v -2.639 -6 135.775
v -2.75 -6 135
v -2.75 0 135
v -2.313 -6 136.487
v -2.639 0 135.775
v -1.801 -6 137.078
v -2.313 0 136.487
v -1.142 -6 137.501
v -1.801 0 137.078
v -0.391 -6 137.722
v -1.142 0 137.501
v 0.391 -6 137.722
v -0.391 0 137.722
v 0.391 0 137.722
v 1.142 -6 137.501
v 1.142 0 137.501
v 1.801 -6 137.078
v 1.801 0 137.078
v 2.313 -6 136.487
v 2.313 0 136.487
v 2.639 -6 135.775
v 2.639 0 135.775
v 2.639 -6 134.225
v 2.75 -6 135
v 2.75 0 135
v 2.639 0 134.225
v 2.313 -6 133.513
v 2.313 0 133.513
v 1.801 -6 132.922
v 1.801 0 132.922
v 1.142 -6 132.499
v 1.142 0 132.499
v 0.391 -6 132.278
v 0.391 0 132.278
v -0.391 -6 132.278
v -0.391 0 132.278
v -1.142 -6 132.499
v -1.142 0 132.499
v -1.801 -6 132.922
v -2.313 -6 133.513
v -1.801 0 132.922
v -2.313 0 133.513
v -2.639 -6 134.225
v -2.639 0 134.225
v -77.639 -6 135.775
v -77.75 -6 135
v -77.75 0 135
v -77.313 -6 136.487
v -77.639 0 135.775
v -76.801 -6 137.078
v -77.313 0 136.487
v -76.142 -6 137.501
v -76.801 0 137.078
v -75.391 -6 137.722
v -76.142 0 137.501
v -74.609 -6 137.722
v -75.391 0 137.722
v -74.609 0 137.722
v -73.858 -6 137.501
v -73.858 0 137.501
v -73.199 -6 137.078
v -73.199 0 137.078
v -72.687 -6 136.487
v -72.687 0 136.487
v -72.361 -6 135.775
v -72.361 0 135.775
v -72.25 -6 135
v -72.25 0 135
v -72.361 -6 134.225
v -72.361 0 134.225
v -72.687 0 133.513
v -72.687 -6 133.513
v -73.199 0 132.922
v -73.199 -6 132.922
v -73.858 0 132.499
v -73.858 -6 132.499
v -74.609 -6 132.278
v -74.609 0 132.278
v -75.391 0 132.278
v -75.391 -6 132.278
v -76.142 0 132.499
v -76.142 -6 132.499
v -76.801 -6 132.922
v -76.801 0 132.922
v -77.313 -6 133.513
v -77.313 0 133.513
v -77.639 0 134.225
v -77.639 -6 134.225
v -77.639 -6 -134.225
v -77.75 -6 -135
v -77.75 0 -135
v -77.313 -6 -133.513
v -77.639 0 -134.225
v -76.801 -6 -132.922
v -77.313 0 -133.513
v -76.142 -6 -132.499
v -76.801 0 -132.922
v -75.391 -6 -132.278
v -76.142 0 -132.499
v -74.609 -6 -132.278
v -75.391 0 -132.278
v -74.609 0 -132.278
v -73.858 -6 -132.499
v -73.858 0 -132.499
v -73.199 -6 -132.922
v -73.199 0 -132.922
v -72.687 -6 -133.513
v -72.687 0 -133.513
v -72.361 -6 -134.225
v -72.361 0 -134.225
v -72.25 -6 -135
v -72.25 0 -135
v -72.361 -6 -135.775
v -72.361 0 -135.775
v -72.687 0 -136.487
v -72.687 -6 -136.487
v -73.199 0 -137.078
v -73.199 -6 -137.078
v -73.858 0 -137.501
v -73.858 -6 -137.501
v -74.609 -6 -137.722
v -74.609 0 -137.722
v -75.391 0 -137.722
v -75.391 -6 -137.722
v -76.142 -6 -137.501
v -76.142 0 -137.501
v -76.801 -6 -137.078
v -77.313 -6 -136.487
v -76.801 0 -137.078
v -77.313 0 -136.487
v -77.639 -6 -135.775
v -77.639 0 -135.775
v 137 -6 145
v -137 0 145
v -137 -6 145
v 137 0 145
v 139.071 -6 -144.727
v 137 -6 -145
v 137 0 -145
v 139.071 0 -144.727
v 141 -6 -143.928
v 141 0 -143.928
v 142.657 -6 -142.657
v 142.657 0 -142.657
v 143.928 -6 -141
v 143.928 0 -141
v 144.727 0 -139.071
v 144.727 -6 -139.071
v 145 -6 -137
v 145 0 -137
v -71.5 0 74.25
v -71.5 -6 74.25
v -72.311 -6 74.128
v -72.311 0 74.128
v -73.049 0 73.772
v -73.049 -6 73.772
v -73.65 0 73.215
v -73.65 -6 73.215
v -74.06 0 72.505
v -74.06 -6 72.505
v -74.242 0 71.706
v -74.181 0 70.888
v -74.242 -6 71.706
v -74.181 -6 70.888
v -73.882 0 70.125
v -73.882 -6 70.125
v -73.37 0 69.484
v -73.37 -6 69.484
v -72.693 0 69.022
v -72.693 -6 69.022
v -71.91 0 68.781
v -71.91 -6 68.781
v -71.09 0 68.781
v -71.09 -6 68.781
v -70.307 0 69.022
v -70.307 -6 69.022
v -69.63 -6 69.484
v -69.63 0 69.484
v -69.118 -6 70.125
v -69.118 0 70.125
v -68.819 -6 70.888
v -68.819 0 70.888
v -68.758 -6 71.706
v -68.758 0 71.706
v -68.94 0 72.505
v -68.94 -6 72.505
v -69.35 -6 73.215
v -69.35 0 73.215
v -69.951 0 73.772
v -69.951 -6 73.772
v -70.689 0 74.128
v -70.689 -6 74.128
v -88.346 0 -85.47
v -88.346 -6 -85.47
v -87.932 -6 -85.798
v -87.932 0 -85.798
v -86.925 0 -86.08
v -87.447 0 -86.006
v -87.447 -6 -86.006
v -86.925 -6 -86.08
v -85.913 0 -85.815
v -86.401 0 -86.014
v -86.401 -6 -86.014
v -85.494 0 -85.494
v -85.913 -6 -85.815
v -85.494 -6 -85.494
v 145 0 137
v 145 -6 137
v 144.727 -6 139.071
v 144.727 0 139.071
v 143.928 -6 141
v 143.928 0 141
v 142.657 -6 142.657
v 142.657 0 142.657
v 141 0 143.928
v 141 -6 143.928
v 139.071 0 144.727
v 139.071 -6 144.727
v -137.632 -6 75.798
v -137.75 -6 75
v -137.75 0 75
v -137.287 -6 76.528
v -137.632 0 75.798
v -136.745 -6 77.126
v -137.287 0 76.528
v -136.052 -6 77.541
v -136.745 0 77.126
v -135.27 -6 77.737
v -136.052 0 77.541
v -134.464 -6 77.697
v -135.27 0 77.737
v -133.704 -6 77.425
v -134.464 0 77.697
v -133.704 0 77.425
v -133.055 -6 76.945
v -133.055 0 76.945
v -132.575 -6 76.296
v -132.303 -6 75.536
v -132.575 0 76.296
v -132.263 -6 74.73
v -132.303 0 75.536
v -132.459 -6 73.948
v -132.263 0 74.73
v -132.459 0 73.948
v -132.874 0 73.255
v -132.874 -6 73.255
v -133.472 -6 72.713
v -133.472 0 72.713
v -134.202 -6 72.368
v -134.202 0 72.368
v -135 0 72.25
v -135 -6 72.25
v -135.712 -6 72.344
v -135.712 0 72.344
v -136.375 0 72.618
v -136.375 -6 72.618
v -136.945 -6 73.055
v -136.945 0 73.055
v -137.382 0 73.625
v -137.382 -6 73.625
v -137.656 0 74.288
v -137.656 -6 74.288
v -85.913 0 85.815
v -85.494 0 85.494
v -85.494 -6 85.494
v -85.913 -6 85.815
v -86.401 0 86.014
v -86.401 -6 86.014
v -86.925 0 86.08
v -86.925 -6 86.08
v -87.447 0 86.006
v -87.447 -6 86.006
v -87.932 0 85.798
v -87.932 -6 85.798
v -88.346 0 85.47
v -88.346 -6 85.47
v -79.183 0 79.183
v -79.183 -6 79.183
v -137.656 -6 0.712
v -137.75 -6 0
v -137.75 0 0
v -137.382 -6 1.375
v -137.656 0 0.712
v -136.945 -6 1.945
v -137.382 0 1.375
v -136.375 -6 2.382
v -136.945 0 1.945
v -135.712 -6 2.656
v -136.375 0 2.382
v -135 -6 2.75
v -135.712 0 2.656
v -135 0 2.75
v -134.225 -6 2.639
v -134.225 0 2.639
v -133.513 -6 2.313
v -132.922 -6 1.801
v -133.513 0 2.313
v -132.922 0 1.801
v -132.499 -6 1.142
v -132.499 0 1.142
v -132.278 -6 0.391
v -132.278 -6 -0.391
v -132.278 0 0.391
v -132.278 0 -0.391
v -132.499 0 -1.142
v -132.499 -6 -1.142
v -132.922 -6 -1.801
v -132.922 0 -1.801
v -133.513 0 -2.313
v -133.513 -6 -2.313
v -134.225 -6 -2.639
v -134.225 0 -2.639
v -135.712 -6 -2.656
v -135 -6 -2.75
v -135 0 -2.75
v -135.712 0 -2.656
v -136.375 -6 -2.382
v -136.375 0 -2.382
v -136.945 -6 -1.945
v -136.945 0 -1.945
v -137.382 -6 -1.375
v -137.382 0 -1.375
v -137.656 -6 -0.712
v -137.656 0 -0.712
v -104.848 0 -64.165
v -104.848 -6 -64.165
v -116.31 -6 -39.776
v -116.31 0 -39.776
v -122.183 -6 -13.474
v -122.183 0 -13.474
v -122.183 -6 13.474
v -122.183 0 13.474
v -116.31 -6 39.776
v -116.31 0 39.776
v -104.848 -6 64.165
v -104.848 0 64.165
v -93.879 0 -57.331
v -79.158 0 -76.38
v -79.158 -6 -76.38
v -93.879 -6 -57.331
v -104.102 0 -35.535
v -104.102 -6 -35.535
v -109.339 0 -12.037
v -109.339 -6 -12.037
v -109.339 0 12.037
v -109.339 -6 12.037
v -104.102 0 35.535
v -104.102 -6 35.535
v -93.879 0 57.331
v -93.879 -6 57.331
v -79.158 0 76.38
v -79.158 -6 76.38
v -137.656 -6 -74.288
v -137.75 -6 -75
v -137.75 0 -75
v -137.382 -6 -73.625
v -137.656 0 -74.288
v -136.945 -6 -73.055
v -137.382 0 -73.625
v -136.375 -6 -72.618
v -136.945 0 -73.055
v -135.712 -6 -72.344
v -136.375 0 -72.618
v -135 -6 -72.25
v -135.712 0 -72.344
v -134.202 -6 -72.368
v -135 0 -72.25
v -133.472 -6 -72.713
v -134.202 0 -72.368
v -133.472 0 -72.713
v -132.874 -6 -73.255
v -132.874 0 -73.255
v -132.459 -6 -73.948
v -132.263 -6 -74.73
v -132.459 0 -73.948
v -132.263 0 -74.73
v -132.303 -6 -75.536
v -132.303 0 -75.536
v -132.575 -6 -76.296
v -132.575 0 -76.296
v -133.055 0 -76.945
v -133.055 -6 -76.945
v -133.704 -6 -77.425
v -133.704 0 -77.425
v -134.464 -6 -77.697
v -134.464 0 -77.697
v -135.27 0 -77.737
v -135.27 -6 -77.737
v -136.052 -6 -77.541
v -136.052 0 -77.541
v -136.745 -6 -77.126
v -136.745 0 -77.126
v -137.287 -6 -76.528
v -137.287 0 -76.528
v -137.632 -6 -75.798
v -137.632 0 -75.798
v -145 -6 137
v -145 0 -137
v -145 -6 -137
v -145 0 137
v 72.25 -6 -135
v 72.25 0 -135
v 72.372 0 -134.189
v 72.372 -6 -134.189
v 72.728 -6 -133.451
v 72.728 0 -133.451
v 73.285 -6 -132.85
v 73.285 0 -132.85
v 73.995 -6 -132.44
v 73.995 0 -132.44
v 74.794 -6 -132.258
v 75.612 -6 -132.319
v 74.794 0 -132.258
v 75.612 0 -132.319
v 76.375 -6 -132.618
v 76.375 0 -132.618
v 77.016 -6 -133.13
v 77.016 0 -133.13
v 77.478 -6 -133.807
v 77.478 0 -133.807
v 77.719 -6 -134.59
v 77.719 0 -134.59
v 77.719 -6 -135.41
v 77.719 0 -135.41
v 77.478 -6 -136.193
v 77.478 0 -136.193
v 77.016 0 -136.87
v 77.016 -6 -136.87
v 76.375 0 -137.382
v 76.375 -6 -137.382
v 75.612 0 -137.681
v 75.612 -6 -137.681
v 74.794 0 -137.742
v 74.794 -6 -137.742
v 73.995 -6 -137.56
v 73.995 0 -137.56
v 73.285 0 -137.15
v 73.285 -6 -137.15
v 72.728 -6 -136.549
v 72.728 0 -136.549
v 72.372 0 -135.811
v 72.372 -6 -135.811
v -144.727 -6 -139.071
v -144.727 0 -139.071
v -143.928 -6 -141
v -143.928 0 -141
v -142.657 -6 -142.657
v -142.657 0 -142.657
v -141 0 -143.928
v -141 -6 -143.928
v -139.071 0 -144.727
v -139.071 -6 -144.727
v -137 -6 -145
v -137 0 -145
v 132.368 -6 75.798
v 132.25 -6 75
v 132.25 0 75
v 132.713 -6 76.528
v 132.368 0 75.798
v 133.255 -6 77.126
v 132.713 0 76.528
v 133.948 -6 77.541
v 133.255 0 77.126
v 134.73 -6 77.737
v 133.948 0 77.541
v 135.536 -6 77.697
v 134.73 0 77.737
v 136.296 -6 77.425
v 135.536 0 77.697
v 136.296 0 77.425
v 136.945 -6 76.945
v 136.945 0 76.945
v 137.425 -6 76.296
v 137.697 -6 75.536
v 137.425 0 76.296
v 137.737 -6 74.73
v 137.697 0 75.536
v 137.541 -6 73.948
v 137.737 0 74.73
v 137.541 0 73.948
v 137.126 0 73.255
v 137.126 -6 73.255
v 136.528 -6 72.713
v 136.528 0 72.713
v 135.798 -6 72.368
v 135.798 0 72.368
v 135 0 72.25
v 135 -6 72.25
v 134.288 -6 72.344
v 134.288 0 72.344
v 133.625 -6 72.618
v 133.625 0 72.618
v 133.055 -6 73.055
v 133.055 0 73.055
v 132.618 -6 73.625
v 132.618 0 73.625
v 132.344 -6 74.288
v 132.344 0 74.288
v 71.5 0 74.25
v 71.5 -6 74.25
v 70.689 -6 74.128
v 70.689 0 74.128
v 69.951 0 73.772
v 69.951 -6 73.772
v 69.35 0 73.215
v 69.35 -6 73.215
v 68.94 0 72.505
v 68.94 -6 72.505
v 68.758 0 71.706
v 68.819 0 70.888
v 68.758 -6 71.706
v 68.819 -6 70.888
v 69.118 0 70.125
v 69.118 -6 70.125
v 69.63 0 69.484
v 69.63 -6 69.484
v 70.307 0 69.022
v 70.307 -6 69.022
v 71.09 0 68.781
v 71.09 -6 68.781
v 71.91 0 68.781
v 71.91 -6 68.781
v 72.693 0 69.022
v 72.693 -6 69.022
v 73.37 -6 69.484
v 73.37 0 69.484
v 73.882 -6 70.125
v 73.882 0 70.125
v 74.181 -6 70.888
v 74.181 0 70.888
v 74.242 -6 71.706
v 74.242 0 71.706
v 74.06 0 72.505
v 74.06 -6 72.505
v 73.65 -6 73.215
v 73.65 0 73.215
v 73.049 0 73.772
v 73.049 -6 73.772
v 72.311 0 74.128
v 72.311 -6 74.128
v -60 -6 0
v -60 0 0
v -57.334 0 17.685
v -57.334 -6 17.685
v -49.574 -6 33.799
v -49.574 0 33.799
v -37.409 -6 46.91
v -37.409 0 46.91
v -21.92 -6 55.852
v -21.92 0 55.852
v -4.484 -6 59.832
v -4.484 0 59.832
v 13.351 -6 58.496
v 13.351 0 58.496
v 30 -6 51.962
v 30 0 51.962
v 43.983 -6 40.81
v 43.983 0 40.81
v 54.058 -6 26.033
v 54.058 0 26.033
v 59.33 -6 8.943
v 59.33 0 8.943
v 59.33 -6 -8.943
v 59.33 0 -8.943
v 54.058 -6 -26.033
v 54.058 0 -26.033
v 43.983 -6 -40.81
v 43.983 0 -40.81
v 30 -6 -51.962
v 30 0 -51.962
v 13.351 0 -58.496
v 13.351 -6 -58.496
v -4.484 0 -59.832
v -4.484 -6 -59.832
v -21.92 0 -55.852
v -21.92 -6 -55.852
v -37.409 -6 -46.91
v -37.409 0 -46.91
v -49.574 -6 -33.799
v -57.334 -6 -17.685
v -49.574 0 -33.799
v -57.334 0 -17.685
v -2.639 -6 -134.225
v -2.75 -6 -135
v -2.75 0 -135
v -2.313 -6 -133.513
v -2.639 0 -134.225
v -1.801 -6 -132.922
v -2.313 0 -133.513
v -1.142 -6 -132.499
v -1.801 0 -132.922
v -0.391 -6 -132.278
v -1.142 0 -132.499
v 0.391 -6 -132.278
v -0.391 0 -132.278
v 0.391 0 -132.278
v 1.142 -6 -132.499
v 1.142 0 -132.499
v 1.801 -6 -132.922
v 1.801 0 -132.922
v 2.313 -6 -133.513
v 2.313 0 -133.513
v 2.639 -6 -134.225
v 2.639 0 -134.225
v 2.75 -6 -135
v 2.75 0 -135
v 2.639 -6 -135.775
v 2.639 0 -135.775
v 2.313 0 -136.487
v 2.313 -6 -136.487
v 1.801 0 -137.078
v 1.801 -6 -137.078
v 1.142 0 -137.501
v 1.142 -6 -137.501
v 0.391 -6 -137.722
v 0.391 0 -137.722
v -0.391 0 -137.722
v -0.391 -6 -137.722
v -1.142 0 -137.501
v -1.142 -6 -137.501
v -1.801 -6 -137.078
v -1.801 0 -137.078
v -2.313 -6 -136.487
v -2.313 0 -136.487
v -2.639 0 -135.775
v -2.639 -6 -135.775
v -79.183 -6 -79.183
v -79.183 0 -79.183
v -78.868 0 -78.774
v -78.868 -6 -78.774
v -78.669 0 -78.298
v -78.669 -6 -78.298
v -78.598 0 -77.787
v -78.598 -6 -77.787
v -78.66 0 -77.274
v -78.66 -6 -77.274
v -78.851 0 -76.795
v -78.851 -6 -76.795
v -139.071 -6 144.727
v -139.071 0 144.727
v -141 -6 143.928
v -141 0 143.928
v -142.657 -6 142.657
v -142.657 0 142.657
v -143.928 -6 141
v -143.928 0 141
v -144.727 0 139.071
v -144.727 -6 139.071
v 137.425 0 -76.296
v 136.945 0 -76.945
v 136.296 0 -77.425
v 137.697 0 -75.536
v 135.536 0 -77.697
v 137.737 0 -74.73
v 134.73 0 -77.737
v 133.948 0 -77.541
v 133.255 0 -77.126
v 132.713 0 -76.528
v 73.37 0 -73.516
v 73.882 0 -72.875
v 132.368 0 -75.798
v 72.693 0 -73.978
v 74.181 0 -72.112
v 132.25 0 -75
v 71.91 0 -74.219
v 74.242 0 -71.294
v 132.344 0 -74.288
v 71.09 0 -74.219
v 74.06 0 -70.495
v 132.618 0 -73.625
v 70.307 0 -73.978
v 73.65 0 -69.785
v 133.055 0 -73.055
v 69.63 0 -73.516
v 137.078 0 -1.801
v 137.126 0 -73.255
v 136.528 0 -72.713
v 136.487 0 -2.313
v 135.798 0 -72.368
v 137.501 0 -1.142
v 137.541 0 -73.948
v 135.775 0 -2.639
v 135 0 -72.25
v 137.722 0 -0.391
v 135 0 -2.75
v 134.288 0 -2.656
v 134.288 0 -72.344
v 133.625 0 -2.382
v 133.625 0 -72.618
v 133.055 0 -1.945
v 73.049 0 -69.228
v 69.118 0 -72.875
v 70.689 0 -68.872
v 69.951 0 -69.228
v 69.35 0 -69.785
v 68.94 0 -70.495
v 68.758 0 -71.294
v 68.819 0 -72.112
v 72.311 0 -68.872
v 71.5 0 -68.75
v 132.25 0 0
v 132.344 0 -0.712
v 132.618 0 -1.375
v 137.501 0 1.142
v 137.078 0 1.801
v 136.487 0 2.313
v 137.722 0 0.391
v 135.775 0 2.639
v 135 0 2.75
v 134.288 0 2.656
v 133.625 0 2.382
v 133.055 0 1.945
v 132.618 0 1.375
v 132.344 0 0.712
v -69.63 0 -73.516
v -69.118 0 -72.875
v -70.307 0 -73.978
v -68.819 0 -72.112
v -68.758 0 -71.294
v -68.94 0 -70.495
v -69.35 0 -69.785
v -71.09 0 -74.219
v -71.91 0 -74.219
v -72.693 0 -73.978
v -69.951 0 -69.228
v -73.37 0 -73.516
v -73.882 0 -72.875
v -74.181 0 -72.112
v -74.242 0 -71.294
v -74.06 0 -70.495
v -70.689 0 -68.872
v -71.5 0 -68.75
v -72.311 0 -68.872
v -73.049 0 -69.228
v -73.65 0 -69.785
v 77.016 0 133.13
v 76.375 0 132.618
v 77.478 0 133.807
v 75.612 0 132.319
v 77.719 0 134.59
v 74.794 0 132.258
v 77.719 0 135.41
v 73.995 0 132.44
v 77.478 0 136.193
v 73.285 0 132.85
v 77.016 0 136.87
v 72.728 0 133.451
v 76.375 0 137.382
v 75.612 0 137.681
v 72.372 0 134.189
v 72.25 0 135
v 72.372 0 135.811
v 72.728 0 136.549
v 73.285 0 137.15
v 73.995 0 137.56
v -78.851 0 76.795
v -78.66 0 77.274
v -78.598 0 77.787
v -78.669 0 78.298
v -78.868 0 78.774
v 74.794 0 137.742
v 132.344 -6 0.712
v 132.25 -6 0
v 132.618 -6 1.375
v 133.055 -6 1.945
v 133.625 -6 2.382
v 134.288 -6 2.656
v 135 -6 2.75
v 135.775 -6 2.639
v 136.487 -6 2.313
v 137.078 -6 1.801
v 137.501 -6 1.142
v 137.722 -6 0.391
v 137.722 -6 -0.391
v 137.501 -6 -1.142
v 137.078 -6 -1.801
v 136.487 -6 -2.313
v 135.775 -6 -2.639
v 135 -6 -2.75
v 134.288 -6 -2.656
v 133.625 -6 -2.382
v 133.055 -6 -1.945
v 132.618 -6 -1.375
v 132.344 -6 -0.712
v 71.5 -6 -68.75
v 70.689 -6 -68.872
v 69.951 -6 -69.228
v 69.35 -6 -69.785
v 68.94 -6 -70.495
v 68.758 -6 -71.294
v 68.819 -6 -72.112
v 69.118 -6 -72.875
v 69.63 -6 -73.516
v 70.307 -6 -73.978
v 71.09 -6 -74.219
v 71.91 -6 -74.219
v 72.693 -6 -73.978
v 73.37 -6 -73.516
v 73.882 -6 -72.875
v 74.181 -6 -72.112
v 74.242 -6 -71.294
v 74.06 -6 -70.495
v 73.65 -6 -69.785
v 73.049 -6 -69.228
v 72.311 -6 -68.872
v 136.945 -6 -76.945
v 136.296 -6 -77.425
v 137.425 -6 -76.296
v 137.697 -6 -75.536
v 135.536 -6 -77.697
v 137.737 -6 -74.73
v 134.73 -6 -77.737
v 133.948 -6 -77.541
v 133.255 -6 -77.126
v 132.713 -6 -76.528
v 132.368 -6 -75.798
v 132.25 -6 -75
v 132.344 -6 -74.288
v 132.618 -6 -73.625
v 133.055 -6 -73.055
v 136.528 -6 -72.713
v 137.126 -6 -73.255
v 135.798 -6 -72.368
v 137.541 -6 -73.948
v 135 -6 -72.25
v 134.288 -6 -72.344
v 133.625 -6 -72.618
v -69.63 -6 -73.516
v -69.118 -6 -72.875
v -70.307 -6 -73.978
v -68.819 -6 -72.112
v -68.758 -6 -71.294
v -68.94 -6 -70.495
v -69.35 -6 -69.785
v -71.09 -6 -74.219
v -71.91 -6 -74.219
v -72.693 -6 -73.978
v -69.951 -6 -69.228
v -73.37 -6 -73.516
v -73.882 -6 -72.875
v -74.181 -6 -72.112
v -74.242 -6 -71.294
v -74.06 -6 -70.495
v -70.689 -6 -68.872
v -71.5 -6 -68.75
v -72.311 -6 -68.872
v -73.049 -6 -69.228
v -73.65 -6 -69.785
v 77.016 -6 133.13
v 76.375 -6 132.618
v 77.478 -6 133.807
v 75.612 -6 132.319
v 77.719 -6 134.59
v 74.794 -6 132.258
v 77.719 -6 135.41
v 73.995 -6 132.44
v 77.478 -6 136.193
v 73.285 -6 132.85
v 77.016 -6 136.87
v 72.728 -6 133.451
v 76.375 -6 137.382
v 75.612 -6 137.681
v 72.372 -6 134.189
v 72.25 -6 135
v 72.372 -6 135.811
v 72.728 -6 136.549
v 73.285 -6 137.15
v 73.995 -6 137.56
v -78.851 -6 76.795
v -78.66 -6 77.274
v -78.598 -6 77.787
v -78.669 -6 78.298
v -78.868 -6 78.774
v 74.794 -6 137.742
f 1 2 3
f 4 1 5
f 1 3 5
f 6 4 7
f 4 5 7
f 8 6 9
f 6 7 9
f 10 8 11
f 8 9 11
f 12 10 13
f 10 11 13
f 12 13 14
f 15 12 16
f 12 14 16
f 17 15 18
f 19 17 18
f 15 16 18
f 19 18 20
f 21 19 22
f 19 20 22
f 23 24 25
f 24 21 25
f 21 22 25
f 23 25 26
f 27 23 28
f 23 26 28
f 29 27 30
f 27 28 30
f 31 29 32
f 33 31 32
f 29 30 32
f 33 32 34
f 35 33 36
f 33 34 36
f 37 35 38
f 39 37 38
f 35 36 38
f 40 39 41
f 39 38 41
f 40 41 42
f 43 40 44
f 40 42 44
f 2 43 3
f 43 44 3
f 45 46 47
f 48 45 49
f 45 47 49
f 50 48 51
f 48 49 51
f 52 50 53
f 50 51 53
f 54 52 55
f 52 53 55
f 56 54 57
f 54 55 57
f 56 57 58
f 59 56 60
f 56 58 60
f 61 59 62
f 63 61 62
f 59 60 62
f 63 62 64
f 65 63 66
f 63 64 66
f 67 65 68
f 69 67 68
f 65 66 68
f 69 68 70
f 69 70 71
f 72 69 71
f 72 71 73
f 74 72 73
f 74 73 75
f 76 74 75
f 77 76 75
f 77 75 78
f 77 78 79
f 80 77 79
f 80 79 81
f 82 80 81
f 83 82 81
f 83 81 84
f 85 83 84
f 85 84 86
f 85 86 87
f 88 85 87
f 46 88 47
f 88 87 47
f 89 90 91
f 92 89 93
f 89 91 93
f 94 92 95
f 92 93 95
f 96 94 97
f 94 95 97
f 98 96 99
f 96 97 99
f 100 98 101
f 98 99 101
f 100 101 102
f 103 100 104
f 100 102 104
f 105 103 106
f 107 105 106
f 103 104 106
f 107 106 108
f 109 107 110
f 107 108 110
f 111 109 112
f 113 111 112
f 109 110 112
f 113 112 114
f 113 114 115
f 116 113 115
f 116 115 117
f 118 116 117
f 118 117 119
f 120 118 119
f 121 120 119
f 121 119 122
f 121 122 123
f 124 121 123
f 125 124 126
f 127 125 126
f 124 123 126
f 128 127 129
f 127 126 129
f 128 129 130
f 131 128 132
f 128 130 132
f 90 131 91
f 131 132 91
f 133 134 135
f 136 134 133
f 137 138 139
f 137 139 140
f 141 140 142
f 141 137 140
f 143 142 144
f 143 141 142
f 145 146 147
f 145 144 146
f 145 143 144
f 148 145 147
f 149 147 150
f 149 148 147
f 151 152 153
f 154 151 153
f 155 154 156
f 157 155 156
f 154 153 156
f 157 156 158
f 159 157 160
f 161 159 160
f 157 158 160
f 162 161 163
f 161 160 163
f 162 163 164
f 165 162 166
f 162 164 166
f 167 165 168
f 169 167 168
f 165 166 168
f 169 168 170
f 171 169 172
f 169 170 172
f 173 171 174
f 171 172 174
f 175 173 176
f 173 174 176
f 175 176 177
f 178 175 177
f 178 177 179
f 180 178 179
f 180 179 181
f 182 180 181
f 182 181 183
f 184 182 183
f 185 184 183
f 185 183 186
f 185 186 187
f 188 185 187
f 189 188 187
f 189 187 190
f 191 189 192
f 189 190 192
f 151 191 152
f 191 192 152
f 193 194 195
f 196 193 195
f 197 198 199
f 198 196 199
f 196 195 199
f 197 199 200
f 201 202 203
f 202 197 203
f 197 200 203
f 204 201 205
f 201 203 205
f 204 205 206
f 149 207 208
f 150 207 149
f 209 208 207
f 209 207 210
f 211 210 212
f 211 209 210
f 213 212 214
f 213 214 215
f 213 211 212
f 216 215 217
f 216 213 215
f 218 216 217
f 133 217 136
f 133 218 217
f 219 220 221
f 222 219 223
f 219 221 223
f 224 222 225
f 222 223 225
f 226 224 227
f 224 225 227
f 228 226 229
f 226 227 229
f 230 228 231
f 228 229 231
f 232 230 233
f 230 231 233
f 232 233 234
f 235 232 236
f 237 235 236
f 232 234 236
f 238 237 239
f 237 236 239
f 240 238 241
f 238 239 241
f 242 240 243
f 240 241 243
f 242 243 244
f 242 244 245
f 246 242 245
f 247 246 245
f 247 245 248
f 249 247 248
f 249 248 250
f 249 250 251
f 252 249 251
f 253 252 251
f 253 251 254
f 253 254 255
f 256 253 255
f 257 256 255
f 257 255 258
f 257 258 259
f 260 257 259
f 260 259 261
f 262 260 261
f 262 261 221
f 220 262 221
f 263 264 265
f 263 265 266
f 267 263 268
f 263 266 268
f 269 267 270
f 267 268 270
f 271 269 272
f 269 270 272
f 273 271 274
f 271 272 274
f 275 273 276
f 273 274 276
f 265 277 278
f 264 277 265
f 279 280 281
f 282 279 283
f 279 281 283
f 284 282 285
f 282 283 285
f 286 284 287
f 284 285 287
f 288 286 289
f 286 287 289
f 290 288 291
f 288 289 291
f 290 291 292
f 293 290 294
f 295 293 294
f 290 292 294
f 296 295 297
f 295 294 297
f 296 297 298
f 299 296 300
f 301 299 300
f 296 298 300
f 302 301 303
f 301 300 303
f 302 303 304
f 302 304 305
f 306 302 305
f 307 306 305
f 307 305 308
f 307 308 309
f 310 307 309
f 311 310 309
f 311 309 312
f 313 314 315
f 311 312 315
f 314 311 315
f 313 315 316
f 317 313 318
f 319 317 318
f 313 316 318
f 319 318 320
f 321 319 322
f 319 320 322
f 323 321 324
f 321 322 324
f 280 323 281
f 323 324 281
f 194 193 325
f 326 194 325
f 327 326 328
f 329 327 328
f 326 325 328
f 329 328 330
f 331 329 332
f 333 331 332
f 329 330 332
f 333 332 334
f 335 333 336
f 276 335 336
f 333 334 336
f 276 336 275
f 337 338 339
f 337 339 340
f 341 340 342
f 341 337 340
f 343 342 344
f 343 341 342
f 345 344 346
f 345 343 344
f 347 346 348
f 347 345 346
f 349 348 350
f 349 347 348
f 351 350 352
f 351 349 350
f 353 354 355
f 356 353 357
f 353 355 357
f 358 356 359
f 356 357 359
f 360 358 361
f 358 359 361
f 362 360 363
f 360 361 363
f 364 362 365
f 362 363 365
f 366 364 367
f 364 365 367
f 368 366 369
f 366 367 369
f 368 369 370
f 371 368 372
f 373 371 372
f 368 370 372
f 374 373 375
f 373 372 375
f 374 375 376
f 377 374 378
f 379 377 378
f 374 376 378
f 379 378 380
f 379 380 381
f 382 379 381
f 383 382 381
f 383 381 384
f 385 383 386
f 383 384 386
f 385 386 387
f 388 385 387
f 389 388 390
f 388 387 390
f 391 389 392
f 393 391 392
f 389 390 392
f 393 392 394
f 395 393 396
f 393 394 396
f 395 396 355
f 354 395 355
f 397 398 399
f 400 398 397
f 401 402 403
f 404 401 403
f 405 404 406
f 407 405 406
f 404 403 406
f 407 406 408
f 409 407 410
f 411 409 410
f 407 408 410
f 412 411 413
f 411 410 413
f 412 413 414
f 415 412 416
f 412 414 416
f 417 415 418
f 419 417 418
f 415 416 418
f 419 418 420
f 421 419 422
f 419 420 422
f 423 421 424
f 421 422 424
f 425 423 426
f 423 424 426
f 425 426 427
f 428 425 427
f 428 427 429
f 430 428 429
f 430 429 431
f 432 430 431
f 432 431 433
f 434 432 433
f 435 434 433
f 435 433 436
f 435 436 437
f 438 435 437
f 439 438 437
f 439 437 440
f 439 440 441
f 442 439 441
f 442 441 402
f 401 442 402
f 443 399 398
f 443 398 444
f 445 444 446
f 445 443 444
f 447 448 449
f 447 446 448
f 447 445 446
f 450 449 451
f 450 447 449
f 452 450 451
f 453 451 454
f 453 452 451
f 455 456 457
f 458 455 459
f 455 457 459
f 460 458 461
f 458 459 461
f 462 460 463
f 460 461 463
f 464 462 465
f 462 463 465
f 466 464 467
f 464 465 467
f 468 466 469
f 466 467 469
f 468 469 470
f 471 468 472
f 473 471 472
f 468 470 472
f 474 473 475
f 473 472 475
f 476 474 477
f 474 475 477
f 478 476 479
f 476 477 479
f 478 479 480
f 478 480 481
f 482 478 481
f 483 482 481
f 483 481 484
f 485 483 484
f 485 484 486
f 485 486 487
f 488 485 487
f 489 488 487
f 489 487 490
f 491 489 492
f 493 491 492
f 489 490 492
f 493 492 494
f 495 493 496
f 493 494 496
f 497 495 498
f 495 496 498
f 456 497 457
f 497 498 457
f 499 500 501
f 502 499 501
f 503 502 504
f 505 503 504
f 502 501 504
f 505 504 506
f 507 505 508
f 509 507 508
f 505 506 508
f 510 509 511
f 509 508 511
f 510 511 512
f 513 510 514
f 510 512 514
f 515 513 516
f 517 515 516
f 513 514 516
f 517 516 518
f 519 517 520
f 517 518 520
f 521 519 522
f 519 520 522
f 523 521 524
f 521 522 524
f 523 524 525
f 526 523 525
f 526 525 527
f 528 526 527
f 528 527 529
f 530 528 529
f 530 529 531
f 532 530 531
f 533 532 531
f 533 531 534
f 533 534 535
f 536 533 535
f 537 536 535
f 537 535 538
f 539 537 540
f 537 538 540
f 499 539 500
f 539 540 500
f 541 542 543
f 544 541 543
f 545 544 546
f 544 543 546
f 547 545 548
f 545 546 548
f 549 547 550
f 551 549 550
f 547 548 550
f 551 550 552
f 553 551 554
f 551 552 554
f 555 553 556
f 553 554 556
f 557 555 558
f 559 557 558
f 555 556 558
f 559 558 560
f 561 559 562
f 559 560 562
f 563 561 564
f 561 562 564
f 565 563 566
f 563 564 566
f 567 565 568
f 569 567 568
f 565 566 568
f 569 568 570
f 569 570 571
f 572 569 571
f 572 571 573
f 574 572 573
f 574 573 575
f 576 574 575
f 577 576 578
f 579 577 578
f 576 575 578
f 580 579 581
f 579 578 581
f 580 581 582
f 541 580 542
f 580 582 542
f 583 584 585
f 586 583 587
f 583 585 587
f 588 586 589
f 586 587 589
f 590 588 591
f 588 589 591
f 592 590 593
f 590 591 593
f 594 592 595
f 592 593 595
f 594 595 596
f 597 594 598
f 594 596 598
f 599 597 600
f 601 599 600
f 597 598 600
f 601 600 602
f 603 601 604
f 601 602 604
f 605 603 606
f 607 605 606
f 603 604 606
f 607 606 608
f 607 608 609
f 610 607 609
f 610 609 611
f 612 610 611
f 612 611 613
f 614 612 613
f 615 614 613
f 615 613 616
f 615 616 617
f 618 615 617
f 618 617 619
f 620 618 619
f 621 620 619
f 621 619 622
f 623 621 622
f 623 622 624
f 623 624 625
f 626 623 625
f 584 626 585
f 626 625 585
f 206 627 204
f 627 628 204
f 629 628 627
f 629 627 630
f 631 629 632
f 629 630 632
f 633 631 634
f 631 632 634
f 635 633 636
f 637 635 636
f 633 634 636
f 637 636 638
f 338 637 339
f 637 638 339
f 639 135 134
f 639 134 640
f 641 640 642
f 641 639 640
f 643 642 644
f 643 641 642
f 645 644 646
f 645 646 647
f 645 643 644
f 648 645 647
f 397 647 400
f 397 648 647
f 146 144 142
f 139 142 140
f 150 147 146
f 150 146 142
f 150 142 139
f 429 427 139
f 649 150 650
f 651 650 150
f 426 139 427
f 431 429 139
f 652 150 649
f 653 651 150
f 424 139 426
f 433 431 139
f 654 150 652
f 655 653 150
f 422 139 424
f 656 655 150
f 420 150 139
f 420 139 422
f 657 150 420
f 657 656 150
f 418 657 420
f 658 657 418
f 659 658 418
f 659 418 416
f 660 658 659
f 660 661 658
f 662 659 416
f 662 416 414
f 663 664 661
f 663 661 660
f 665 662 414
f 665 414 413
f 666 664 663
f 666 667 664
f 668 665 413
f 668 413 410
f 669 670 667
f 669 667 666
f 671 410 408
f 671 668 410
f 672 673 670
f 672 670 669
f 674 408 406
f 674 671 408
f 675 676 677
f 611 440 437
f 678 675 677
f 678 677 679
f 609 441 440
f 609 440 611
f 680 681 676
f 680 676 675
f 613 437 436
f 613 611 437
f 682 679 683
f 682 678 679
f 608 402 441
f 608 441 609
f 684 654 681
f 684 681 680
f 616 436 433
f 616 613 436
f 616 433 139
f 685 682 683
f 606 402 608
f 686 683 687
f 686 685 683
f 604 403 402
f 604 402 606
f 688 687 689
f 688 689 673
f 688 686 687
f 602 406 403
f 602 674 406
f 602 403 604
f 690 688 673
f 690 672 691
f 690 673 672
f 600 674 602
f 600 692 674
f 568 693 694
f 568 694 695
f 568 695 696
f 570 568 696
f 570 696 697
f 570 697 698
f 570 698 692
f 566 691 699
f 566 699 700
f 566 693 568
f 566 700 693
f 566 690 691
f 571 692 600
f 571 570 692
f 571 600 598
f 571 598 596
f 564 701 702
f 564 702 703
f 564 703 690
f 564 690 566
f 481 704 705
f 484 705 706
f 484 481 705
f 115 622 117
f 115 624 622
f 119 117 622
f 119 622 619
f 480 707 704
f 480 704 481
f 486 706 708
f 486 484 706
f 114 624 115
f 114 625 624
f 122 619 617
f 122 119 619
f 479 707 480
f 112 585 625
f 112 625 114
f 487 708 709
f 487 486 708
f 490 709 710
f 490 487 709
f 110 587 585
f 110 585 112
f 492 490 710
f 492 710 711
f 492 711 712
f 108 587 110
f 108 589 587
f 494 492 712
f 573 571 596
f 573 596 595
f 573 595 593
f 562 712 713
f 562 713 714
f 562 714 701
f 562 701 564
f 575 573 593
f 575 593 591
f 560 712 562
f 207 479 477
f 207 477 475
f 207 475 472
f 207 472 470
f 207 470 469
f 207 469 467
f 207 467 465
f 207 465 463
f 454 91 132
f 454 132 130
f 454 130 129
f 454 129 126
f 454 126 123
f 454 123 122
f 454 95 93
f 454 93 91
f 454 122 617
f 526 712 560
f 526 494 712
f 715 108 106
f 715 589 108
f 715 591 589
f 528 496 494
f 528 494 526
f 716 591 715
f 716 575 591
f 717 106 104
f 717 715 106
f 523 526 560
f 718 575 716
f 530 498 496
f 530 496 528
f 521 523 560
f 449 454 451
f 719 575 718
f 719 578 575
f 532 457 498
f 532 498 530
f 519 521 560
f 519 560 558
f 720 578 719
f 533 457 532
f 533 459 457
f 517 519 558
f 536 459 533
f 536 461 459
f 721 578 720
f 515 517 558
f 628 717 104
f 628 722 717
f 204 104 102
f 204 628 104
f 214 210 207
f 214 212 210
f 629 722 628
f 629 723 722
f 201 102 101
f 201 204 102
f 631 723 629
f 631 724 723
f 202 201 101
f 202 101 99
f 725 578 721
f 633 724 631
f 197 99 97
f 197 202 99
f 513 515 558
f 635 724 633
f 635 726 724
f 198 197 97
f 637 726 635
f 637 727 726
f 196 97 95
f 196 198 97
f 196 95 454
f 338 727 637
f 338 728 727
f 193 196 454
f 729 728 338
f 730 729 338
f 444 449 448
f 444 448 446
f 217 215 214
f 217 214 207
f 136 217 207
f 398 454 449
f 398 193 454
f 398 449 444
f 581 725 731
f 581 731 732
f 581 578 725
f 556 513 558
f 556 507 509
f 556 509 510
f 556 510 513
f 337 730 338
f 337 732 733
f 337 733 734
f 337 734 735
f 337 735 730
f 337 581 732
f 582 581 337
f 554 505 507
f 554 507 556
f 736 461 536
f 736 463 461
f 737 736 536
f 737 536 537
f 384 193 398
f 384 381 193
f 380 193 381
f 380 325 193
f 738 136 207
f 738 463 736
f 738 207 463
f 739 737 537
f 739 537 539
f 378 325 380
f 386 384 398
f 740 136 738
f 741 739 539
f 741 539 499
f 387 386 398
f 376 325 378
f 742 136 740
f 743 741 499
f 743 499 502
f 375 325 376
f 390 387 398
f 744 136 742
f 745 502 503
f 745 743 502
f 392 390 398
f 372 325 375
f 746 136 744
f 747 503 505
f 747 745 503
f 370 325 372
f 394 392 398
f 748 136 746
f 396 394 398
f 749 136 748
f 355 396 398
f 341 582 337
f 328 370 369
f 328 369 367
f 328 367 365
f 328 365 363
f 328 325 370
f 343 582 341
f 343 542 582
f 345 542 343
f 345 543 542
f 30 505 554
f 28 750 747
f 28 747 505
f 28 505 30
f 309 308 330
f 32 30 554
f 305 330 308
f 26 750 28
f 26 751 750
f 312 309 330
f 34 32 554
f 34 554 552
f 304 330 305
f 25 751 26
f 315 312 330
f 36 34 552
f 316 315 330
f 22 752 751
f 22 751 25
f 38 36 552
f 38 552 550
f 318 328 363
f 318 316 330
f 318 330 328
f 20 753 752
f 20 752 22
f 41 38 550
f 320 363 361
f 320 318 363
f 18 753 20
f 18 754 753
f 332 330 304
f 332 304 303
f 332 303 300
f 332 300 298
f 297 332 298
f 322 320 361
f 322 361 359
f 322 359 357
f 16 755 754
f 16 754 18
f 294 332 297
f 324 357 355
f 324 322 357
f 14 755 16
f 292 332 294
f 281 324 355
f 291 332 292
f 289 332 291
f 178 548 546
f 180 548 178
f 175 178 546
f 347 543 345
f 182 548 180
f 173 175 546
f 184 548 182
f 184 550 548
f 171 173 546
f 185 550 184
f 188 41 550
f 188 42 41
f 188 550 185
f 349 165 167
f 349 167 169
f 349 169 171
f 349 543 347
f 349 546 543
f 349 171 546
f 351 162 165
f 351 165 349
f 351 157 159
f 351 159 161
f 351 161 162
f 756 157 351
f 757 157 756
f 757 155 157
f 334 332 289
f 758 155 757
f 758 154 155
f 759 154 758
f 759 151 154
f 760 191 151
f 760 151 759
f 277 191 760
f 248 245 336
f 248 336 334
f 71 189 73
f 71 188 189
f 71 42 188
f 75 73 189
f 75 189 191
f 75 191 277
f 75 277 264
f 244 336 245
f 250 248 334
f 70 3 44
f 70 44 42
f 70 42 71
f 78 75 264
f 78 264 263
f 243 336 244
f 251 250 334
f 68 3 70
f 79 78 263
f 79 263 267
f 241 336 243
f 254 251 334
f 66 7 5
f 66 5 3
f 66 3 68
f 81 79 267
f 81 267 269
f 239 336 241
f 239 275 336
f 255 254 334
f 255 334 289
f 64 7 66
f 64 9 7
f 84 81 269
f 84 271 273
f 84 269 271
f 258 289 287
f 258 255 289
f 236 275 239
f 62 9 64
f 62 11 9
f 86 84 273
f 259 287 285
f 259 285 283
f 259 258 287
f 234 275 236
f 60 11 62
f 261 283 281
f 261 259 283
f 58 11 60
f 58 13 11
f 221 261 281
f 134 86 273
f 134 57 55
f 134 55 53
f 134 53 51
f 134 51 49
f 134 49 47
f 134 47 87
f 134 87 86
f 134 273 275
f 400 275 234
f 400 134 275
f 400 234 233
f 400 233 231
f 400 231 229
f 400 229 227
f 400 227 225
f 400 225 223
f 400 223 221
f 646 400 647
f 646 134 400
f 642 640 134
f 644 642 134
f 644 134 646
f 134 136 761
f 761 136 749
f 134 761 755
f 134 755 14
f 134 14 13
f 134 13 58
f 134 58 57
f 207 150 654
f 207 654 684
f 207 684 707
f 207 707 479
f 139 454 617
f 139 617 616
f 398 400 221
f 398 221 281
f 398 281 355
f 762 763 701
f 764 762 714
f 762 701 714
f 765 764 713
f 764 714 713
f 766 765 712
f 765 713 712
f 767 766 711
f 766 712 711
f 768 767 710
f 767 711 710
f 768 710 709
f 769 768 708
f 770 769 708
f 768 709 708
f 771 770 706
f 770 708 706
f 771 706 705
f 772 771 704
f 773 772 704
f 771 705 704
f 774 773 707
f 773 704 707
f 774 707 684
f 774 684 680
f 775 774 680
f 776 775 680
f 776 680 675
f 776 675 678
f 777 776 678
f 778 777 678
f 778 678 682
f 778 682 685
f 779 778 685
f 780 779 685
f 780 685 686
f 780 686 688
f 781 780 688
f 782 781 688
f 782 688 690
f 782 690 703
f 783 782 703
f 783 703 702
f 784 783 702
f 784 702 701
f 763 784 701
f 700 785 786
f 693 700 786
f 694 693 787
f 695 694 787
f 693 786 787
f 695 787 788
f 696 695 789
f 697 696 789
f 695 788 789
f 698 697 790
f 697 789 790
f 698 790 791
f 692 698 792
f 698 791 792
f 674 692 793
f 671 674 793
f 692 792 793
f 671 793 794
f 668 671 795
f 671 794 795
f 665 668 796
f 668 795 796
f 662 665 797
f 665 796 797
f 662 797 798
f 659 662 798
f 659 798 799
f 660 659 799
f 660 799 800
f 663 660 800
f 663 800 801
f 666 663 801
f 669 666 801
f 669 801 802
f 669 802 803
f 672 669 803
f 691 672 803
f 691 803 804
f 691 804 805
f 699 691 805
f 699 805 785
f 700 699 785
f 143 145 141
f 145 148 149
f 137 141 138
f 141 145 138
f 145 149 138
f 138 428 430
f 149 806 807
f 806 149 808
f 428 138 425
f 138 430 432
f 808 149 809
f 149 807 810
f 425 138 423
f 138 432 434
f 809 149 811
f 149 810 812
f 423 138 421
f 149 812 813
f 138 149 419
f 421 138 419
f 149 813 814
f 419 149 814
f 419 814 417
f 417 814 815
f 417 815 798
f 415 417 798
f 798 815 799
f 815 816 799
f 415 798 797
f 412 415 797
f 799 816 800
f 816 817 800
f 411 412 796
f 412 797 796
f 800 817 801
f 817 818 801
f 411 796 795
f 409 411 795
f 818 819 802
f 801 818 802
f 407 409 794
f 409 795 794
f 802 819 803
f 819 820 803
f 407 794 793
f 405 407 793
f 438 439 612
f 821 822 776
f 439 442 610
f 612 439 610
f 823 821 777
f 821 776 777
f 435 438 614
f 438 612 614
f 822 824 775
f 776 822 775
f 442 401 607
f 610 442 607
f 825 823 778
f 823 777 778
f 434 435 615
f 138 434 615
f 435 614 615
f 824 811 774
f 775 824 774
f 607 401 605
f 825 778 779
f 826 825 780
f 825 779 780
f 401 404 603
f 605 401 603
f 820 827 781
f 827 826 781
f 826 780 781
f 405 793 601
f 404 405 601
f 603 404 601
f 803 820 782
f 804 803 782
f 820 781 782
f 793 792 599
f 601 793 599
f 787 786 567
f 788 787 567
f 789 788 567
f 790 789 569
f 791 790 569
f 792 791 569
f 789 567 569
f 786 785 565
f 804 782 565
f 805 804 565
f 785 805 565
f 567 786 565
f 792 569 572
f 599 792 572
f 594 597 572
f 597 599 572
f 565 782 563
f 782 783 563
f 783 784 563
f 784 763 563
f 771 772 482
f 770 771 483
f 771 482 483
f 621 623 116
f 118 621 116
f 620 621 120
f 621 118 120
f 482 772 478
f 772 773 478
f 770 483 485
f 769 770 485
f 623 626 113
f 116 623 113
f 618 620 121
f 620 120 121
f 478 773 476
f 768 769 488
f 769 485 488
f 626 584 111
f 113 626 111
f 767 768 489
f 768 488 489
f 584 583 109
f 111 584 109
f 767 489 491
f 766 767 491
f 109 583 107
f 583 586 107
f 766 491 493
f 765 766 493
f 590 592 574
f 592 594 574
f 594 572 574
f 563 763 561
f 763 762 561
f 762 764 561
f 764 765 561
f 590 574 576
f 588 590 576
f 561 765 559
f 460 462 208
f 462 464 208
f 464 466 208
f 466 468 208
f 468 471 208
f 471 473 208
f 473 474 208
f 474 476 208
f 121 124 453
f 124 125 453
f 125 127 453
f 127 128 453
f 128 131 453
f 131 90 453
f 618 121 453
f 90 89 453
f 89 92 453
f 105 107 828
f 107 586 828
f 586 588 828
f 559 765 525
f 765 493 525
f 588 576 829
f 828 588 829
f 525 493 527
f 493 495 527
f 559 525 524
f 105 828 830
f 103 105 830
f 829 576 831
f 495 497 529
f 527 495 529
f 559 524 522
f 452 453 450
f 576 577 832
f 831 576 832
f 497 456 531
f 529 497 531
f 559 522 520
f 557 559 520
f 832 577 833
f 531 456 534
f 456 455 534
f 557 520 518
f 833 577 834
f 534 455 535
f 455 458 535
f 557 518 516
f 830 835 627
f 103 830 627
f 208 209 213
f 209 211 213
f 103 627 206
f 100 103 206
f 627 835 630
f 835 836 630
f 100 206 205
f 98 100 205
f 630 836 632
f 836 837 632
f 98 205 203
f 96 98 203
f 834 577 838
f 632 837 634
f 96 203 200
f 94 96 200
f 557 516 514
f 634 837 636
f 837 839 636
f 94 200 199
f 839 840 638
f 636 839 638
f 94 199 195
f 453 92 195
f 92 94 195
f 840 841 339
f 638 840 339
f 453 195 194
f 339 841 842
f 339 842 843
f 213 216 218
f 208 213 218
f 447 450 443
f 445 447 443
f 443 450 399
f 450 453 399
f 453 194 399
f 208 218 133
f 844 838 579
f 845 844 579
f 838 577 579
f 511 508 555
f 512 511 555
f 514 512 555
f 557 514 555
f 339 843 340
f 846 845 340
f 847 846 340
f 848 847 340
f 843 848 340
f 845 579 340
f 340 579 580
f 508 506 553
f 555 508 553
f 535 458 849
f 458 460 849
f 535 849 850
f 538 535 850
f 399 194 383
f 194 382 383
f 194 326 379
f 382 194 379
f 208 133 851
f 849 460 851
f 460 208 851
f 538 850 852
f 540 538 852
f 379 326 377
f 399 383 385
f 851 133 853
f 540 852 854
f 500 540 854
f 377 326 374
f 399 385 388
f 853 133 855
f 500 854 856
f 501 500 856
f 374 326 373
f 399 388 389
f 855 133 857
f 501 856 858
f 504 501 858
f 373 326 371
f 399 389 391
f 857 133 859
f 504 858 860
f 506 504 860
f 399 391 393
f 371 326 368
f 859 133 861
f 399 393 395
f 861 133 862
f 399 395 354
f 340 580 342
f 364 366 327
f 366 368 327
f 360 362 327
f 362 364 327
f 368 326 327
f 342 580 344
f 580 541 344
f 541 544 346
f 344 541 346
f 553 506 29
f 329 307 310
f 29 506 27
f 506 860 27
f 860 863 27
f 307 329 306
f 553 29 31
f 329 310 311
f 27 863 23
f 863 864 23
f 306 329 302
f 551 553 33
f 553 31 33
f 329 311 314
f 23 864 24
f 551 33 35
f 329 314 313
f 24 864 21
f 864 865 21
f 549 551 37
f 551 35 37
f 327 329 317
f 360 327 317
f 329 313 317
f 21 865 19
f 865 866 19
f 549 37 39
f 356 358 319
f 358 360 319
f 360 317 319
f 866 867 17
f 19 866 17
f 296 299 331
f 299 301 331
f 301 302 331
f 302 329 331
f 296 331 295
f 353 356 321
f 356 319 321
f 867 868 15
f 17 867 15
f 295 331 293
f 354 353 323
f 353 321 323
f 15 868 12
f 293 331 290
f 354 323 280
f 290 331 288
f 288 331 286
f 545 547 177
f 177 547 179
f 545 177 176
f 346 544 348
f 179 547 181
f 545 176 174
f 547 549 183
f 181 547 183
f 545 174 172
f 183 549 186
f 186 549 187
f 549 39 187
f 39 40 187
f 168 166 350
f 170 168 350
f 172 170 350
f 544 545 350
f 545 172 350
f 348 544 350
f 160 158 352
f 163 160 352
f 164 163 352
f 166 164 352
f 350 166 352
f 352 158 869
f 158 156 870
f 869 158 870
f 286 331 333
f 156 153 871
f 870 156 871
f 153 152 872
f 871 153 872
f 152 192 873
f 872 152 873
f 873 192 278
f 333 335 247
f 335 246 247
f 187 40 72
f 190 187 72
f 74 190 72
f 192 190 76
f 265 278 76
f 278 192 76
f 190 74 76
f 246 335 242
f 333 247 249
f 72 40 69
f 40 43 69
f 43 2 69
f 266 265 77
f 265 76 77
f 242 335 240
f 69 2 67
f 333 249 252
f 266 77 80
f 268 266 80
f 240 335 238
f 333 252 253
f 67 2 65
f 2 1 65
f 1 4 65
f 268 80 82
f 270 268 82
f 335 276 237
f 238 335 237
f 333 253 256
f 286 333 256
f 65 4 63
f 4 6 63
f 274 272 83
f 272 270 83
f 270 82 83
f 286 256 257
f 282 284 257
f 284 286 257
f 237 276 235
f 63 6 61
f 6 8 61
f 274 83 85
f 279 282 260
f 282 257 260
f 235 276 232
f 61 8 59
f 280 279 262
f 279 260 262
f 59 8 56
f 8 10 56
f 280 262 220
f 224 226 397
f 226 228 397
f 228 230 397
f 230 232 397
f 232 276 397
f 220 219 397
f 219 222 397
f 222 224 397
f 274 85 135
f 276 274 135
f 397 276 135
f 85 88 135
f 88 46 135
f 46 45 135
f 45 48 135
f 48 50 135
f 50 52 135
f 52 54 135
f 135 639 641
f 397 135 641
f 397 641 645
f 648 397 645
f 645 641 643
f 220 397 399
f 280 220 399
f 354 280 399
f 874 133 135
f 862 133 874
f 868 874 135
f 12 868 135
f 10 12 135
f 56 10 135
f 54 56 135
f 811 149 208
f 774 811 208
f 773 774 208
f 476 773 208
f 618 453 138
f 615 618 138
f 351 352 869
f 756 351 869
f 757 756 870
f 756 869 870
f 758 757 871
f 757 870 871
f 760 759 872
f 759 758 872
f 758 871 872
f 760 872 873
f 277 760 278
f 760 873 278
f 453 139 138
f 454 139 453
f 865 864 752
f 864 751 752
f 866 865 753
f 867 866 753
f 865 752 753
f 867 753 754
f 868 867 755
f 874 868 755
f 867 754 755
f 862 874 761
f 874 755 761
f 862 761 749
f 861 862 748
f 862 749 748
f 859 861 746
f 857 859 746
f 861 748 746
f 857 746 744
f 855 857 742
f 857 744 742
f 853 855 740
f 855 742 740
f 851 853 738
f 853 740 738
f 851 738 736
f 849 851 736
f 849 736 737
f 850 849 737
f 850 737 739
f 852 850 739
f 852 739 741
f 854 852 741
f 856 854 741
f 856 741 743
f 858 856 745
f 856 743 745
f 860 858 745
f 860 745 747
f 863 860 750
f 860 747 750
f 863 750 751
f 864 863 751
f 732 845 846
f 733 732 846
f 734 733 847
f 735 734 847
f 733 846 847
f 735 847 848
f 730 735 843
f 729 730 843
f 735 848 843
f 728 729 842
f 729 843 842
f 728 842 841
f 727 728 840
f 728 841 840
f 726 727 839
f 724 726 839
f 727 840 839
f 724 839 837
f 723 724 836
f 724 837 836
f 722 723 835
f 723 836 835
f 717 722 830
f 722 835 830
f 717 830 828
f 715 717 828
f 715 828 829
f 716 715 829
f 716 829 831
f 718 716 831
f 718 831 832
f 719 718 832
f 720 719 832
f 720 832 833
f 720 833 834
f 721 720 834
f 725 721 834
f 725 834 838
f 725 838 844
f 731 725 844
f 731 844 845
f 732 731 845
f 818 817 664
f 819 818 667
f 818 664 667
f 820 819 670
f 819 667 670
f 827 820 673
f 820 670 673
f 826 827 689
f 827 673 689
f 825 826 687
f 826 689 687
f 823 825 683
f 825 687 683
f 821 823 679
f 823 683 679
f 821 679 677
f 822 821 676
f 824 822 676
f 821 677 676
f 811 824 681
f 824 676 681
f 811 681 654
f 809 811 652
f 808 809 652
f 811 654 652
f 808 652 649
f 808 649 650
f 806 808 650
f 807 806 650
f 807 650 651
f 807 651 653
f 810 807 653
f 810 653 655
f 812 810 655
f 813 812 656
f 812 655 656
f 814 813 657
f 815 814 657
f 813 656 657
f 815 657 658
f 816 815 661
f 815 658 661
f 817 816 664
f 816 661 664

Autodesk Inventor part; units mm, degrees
ref_plane "YZ Plane" through (0, 0, 0) normal (1, 0, 0) x (0, 1, 0)
ref_plane "XZ Plane" through (0, 0, 0) normal (0, 1, 0) x (-1, 0, 0)
ref_plane "XY Plane" through (0, 0, 0) normal (0, 0, 1) x (1, 0, 0)
sketch "Sketch1" plane through (0, 0, 0) normal (0, 1, 0) x (-1, 0, 0)
  line L0 (-145, -145) -> (145, -145)
  line L1 (145, -145) -> (145, 145)
  line L2 (145, 145) -> (-145, 145)
  line L3 (-145, 145) -> (-145, -145)
  line L4 (-145, -145) -> (145, 145) construction
  line L5 (145, -145) -> (-145, 145) construction
  circle A0 centre (0, 0) radius 60
  line L6 (135, 135) -> (135, -135) construction
  line L7 (135, -135) -> (-135, -135) construction
  line L8 (-135, -135) -> (-135, 135) construction
  line L9 (-135, 135) -> (135, 135) construction
  line L10 (145, 135) -> (125, 135) construction
  line L11 (125, 135) -> (125, -135) construction
  line L12 (-145, 135) -> (-125, 135) construction
  line L13 (-125, 135) -> (-125, -135) construction
  line L14 (-125, 135) -> (125, 135) construction
  line L15 (-125, -135) -> (125, -135) construction
  line L16 (135, 125) -> (135, -125) construction
  line L17 (-135, 125) -> (-135, -125) construction
  circle A1 centre (0, -135) radius 2.75
  line L18 (0, -135) -> (75, -135)
  line L19 (0, -135) -> (-75, -135)
  circle A2 centre (75, -135) radius 2.75
  circle A3 centre (-75, -135) radius 2.75
  line L20 (0, 135) -> (75, 135)
  line L21 (0, 135) -> (-75, 135)
  circle A4 centre (75, 135) radius 2.75
  circle A5 centre (0, 135) radius 2.75
  circle A6 centre (-75, 135) radius 2.75
  line L22 (135, 0) -> (135, -75)
  line L23 (135, 0) -> (135, 75)
  circle A7 centre (135, -75) radius 2.75
  circle A8 centre (135, 0) radius 2.75
  circle A9 centre (135, 75) radius 2.75
  line L24 (-135, 0) -> (-135, -75)
  line L25 (-135, 0) -> (-135, 75)
  circle A10 centre (-135, -75) radius 2.75
  circle A11 centre (-135, 0) radius 2.75
  circle A12 centre (-135, 75) radius 2.75
  dimension "d0" = 290
  dimension "d1" = 290
  dimension "d2" = 120
  dimension "d3" = 10
  dimension "d4" = 20
  dimension "d5" = 20
  dimension "d29" = 5.5
  dimension "d30" = 75
  dimension "d31" = 75
  dimension "d32" = 5.5
  dimension "d33" = 5.5
  dimension "d34" = 75
  dimension "d35" = 75
  dimension "d36" = 5.5
  dimension "d37" = 5.5
  dimension "d38" = 5.5
  dimension "d39" = 75
  dimension "d40" = 75
  dimension "d41" = 5.5
  dimension "d42" = 5.5
  dimension "d43" = 5.5
  dimension "d44" = 75
  dimension "d45" = 75
  dimension "d46" = 5.5
  dimension "d47" = 5.5
  dimension "d48" = 5.5
extrude "Extrusion1" add sketch "Sketch1" against normal blind 6 contours L3 L2 L1 L0 | L18 L19 A1 | A3 | A1 L19 L18 | A2 | L21 A5 L20 | L20 A5 L21 | A4 | A6 | L23 A8 L22 | L22 A8 L23 | A7 | A9 | L25 A11 L24 | L24 A11 L25 | A10 | A12
fillet "Fillet1" radius 8 4 edges at (-145, -3, -145) (-145, -3, 145) (145, -3, 145) (145, -3, -145)
extrude "Extrusion2" cut sketch "Sketch1" against normal through all contours L18 L19 A1 | A3 | A1 L19 L18 | A2 | L21 A5 L20 | L20 A5 L21 | A4 | A6 | L23 A8 L22 | L22 A8 L23 | A7 | A9 | L25 A11 L24 | L24 A11 L25 | A10 | A12
sketch "Sketch3" plane through (0, 0, 0) normal (0, 1, 0) x (1, 0, 0)
  line L0 (-71.5, 71.5) -> (71.5, 71.5)
  line L1 (71.5, 71.5) -> (71.5, -71.5)
  line L2 (71.5, -71.5) -> (-71.5, -71.5)
  line L3 (-71.5, -71.5) -> (-71.5, 71.5)
  line L4 (-71.5, 71.5) -> (71.5, -71.5) construction
  line L5 (71.5, 71.5) -> (-71.5, -71.5) construction
  point P0 (0, 0)
  dimension "d51" = 143
  dimension "d52" = 143
hole "Hole2" at (-71.5, 0, 71.5) at (-71.5, 0, -71.5) at (71.5, 0, -71.5) at (71.5, 0, 71.5) direction (0, -1, 0) diameter 5.5 end through all
sketch "Sketch4" plane through (0, 0, 0) normal (0, 1, 0) x (1, 0, 0)
  line L0 (0, 0) -> (-110, 0) construction
  line L1 (-145, 137) -> (-145, -137) projected
  arc A0 (-77.7817, 77.7817) -> (-77.7817, -77.7817) centre (0, 0) ccw
  arc A1 (-86.9199, 86.9199) -> (-86.9199, -86.9199) centre (0, 0) ccw
  line L2 (-77.7817, 77.7817) -> (-86.9199, 86.9199)
  line L3 (0, 0) -> (222.1817, 0) construction
  line L4 (-77.7817, -77.7817) -> (-86.9199, -86.9199)
  line L5 (0, 0) -> (151.3127, 0) construction
  dimension "d60" = 110
  dimension "d61" = 135
  dimension "d62" = 135
extrude "Extrusion3" cut sketch "Sketch4" against normal blind 10
fillet "Fillet2" radius 2 4 edges at (-77.7817, -3, -77.7817) (-86.9199, -3, -86.9199) (-86.9199, -3, 86.9199) (-77.7817, -3, 77.7817)
equation "\"d32\" = d29"
equation "\"d33\" = d29"
properties part number "BaseTopPlate" material "Aluminum"
